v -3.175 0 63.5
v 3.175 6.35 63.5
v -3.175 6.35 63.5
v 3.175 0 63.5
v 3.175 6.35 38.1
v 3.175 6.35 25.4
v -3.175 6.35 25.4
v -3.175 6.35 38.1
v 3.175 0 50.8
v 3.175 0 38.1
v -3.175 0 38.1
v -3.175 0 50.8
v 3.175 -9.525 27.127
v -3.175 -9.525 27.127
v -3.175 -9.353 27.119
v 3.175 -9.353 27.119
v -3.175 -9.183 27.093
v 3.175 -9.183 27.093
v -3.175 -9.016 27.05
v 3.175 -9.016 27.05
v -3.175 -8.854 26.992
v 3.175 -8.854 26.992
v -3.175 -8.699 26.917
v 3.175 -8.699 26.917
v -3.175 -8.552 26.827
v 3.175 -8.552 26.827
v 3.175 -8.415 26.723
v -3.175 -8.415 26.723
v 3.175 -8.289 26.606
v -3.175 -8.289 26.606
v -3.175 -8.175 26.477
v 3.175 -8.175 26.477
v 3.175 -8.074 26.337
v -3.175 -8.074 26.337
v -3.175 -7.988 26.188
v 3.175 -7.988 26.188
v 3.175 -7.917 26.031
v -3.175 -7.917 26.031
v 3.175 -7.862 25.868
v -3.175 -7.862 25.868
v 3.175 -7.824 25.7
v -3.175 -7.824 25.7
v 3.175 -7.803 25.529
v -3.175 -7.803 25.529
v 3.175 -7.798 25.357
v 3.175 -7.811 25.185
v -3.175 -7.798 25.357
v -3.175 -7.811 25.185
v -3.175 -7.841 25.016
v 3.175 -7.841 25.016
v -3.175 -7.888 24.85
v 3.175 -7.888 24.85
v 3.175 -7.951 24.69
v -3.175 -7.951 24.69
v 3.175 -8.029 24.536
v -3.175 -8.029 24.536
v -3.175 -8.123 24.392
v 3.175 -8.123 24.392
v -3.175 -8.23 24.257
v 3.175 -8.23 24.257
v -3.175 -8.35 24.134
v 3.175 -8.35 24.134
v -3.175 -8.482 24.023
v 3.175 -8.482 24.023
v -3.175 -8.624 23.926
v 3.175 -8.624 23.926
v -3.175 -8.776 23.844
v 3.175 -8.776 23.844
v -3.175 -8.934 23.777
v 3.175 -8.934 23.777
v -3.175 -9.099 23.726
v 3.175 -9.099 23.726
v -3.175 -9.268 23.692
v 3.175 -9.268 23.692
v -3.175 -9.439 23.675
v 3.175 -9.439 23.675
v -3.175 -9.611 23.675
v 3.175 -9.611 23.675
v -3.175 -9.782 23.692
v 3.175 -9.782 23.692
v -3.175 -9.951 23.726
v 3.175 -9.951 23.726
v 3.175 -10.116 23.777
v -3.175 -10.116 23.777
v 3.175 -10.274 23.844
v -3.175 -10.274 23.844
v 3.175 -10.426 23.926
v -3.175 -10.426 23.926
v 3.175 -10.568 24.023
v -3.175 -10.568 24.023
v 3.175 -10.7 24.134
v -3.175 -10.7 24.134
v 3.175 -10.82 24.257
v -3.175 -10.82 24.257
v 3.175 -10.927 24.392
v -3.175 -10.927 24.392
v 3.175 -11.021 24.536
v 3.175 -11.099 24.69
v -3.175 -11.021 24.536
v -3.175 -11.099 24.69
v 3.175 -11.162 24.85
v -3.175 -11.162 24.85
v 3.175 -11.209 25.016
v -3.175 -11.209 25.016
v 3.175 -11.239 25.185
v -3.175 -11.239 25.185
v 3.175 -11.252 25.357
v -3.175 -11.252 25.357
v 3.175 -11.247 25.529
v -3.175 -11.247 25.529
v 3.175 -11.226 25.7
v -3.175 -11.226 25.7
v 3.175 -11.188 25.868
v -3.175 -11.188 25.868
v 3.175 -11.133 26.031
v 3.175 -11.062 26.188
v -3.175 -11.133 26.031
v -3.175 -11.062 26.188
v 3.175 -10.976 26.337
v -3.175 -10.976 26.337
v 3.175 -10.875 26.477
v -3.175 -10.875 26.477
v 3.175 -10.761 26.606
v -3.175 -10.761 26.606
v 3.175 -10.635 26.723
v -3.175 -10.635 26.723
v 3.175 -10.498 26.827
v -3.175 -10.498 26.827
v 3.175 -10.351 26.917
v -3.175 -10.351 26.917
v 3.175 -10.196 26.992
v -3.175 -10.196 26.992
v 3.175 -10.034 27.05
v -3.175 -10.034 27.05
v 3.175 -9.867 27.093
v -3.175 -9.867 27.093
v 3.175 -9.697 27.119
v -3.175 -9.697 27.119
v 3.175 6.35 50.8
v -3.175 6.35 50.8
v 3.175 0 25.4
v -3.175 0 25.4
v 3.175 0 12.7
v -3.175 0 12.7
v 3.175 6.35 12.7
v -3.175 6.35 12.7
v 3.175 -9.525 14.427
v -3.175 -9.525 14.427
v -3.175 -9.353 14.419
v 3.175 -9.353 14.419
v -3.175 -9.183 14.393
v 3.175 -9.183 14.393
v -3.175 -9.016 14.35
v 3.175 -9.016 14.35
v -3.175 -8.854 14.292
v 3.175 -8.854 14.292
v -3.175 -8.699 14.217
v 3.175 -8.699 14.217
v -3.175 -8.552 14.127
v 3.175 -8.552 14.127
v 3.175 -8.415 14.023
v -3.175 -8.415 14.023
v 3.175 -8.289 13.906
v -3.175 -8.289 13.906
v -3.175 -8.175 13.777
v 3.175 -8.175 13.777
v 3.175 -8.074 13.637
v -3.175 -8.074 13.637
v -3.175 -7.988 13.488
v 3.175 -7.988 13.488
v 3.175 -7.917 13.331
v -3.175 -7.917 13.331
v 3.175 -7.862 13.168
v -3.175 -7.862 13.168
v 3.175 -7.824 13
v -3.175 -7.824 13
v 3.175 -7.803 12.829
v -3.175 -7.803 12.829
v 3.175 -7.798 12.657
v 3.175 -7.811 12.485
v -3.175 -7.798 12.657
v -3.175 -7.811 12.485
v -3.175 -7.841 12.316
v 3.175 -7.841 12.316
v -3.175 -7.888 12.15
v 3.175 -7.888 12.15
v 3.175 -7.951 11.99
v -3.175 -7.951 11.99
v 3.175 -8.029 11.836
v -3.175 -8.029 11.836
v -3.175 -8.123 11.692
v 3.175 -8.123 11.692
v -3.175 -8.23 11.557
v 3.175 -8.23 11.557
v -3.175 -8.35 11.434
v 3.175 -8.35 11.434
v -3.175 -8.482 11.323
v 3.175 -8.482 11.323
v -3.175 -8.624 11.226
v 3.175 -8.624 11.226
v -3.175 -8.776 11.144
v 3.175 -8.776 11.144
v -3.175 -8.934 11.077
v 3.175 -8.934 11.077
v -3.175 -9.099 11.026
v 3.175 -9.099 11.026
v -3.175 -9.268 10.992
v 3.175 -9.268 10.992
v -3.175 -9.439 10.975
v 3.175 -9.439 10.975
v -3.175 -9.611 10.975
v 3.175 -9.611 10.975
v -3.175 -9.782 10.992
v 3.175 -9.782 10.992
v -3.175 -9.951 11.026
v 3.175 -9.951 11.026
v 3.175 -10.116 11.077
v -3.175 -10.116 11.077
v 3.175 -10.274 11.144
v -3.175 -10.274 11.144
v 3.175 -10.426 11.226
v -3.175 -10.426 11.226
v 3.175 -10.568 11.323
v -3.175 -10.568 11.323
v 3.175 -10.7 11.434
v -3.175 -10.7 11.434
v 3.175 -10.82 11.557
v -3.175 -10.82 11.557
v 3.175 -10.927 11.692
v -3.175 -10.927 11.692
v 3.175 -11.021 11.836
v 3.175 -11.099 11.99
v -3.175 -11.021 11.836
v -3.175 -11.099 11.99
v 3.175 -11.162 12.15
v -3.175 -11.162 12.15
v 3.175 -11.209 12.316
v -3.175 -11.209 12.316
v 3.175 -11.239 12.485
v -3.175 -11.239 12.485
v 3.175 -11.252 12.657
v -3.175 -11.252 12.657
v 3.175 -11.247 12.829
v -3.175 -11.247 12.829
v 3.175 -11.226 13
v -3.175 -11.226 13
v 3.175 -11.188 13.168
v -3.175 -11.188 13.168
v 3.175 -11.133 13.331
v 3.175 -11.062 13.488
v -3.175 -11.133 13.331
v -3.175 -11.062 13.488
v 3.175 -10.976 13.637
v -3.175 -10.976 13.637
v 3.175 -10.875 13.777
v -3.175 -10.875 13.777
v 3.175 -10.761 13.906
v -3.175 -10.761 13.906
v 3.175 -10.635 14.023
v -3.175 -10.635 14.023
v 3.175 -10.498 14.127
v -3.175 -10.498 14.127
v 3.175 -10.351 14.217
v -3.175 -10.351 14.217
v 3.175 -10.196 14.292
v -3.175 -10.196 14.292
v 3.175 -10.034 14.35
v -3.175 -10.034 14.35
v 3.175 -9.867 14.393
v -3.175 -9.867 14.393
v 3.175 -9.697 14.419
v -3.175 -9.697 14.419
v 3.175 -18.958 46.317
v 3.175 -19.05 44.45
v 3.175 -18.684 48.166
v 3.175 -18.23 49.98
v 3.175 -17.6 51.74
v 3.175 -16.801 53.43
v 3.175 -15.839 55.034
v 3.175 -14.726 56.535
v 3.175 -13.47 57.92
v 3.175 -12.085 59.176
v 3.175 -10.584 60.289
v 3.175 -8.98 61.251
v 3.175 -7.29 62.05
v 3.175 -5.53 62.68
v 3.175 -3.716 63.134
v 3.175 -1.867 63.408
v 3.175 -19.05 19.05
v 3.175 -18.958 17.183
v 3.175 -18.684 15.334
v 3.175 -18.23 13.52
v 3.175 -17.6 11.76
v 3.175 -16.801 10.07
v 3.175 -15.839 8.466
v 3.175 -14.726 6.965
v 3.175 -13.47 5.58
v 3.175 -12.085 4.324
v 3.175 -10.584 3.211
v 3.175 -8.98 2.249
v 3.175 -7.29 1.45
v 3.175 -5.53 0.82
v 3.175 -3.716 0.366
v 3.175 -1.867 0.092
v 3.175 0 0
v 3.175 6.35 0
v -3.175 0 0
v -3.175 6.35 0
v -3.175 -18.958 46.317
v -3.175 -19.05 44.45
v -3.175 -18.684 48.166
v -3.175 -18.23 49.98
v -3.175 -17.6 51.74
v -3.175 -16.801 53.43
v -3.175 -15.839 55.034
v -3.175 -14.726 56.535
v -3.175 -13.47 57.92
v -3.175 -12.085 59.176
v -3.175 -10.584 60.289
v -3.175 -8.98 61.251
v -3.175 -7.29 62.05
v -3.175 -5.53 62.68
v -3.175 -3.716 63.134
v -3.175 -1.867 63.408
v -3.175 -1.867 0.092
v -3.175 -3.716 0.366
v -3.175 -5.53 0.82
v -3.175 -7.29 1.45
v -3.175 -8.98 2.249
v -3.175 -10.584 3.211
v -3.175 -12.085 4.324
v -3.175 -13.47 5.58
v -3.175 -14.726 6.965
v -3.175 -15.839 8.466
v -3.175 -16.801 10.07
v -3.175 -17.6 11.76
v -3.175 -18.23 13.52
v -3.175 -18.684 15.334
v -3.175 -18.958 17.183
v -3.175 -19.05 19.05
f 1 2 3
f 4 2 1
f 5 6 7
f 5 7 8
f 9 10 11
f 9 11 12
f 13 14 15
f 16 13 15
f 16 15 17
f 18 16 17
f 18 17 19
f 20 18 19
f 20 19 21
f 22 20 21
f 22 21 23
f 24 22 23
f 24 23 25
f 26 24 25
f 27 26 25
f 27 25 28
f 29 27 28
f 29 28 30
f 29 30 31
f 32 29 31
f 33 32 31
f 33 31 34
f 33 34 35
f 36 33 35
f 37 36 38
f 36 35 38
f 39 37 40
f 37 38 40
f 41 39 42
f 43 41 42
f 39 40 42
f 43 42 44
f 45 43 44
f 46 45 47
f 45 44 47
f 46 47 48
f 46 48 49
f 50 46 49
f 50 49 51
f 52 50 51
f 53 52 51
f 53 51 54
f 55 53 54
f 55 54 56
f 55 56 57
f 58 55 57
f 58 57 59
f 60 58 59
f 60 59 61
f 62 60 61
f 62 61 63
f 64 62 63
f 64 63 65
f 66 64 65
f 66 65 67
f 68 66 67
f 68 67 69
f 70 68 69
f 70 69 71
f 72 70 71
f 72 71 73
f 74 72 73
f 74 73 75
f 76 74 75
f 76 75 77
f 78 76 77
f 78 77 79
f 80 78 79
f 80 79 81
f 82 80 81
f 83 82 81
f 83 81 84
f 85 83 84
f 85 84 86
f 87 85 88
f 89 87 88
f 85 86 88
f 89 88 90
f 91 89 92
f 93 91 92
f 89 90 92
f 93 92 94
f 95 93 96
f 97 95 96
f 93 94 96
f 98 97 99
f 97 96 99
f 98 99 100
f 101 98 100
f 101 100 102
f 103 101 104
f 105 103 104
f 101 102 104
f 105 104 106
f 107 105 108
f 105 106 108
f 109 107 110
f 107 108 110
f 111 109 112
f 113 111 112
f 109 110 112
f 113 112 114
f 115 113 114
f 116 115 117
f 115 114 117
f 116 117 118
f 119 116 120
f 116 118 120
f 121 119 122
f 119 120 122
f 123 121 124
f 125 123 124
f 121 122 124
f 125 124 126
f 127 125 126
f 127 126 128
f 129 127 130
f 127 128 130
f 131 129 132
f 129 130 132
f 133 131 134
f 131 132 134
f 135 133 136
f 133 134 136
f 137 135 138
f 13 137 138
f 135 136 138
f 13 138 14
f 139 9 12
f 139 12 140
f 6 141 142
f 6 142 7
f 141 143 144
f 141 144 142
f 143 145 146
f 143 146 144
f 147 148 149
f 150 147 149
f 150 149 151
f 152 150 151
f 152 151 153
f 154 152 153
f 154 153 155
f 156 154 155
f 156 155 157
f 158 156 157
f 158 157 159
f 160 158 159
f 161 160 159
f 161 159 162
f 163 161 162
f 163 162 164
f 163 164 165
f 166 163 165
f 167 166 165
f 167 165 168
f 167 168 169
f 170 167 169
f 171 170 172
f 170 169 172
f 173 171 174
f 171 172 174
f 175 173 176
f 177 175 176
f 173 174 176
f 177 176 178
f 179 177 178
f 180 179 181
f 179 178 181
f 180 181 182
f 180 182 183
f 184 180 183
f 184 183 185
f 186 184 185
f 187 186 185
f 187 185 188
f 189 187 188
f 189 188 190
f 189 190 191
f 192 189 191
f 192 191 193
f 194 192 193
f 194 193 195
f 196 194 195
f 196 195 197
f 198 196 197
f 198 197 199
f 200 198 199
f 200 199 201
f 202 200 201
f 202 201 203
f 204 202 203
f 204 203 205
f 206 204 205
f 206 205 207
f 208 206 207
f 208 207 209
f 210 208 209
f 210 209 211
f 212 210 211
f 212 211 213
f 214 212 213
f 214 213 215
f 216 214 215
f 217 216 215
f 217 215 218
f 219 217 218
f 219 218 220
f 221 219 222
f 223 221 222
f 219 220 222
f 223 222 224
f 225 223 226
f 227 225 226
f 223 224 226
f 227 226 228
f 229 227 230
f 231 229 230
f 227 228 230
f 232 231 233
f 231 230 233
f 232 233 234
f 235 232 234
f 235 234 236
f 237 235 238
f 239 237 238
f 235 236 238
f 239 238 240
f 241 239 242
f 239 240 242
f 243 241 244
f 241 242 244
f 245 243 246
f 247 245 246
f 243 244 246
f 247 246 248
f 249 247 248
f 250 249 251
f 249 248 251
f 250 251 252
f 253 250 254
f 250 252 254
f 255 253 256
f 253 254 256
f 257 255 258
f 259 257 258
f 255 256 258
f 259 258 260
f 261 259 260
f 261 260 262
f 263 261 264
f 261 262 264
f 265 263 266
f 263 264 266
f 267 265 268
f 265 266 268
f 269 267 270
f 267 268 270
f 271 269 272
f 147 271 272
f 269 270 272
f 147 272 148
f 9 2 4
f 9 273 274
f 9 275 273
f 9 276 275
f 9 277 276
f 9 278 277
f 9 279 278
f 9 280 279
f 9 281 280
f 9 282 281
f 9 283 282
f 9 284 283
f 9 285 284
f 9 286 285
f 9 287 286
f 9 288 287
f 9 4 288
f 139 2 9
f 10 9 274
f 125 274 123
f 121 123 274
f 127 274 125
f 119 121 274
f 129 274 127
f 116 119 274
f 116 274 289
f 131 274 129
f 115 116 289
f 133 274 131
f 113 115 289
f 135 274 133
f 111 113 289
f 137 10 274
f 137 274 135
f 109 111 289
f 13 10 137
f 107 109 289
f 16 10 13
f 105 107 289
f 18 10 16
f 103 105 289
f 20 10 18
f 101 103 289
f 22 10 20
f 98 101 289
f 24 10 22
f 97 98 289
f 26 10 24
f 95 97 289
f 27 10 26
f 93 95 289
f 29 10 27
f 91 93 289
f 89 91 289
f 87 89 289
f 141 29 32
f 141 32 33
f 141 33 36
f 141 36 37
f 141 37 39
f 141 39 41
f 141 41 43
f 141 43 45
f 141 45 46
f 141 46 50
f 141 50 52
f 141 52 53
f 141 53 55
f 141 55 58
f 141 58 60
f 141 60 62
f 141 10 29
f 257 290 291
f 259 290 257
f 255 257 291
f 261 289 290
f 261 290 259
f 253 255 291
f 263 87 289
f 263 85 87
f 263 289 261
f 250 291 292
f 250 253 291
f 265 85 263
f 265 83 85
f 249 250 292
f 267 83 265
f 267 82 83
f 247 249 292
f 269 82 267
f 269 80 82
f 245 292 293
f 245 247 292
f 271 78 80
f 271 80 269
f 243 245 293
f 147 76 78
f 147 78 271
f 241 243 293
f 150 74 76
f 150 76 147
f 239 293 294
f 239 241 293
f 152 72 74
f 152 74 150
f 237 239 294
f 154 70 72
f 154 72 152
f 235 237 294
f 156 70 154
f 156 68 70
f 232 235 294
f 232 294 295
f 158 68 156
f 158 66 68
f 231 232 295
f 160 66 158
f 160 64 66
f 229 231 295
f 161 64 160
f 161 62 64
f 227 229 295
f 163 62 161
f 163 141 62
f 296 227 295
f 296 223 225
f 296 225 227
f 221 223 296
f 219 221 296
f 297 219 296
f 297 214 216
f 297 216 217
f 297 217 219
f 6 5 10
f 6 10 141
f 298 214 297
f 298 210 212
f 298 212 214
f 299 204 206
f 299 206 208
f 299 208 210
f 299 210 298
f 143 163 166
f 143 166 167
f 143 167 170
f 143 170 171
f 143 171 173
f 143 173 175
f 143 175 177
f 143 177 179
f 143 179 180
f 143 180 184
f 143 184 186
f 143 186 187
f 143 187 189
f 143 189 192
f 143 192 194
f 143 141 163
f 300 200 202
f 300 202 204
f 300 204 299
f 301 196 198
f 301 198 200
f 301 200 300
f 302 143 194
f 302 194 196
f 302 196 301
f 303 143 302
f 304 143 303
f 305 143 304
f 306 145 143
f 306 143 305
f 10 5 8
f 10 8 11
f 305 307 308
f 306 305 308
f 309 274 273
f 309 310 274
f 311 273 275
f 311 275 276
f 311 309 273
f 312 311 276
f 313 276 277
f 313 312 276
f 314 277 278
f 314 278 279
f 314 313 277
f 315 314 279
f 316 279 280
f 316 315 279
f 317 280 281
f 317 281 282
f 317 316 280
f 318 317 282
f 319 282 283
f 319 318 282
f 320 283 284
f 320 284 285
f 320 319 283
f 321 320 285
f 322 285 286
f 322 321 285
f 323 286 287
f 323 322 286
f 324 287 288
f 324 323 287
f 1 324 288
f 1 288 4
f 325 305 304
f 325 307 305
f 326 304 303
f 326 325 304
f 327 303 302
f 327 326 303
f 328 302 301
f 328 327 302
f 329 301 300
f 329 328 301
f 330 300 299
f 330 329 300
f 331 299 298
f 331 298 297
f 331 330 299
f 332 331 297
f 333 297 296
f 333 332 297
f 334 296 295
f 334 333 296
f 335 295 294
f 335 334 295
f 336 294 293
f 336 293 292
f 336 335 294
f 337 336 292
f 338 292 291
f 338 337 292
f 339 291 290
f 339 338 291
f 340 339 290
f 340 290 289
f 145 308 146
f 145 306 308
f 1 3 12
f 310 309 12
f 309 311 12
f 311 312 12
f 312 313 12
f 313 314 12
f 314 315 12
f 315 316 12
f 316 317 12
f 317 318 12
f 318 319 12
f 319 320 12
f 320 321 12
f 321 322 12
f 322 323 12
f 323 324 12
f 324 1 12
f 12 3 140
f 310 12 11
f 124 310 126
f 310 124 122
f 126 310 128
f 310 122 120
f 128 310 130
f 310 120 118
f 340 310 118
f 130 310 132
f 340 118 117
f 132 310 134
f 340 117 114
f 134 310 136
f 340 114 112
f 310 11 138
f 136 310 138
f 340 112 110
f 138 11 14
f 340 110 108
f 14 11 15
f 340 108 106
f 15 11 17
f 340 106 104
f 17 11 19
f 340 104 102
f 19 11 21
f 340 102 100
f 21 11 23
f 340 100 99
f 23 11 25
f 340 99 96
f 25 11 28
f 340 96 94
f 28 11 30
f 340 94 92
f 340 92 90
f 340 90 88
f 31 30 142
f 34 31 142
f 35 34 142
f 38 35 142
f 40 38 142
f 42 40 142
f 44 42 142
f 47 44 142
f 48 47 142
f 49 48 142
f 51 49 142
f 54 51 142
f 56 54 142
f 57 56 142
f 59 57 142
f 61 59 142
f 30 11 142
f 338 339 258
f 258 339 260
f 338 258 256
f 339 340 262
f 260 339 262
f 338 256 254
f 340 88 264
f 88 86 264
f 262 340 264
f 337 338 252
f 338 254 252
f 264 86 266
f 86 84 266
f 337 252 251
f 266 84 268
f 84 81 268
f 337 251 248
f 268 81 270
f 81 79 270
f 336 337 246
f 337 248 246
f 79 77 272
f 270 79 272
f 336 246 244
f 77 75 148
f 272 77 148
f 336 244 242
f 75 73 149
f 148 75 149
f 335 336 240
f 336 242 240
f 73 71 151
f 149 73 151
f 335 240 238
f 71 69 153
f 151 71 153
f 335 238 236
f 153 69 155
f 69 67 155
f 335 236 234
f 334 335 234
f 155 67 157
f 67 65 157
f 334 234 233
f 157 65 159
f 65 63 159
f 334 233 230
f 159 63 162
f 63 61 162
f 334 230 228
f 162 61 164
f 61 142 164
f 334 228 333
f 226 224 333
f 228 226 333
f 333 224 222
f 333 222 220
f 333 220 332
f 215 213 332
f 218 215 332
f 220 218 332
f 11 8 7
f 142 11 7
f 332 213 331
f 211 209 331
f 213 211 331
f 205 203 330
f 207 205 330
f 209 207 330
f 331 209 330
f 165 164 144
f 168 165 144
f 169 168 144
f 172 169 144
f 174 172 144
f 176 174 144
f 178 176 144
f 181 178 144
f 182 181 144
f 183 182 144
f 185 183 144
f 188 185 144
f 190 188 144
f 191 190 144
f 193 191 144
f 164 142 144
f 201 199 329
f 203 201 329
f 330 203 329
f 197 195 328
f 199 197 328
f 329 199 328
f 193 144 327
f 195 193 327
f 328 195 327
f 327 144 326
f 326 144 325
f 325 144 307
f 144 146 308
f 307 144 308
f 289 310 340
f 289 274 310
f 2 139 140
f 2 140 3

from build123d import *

# Parameters (mm, degrees)
BOSS_EXTRUDE1_DEPTH   = 3.175
F_8_32_TAPPED_HOLE1_D = 3.4544
FILLET1_R             = 19.05


with BuildPart() as part:
    # Sketch1 → Boss-Extrude1 (new, symmetric)
    with BuildSketch(Plane(origin=(0, 0, 0), x_dir=(0, 0, -1), z_dir=(1, 0, 0))):
        Polygon((0, 0), (0, 6.35), (-12.7, 6.35), (-12.7, 0), (-25.4, 0), (-25.4, 6.35), (-38.1, 6.35), (-38.1, 0), (-50.8, 0), (-50.8, 6.35), (-63.5, 6.35), (-63.5, -19.05), (0, -19.05), align=None)
    extrude(amount=BOSS_EXTRUDE1_DEPTH, both=True)

    # #8-32 Tapped Hole1 (through all)
    with Locations(Plane(origin=(3.175, 0, 0), x_dir=(0, 0, -1), z_dir=(1, 0, 0))):
        with Locations((-12.7, -9.525), (-25.4, -9.525)):
            Hole(F_8_32_TAPPED_HOLE1_D / 2)

    # Fillet1
    fillet1_edges = [part.edges().sort_by_distance(p)[0] for p in [
        (0, -19.05, 0),
        (0, -19.05, 63.5),
    ]]
    fillet(fillet1_edges, radius=FILLET1_R)


solid = part.part
